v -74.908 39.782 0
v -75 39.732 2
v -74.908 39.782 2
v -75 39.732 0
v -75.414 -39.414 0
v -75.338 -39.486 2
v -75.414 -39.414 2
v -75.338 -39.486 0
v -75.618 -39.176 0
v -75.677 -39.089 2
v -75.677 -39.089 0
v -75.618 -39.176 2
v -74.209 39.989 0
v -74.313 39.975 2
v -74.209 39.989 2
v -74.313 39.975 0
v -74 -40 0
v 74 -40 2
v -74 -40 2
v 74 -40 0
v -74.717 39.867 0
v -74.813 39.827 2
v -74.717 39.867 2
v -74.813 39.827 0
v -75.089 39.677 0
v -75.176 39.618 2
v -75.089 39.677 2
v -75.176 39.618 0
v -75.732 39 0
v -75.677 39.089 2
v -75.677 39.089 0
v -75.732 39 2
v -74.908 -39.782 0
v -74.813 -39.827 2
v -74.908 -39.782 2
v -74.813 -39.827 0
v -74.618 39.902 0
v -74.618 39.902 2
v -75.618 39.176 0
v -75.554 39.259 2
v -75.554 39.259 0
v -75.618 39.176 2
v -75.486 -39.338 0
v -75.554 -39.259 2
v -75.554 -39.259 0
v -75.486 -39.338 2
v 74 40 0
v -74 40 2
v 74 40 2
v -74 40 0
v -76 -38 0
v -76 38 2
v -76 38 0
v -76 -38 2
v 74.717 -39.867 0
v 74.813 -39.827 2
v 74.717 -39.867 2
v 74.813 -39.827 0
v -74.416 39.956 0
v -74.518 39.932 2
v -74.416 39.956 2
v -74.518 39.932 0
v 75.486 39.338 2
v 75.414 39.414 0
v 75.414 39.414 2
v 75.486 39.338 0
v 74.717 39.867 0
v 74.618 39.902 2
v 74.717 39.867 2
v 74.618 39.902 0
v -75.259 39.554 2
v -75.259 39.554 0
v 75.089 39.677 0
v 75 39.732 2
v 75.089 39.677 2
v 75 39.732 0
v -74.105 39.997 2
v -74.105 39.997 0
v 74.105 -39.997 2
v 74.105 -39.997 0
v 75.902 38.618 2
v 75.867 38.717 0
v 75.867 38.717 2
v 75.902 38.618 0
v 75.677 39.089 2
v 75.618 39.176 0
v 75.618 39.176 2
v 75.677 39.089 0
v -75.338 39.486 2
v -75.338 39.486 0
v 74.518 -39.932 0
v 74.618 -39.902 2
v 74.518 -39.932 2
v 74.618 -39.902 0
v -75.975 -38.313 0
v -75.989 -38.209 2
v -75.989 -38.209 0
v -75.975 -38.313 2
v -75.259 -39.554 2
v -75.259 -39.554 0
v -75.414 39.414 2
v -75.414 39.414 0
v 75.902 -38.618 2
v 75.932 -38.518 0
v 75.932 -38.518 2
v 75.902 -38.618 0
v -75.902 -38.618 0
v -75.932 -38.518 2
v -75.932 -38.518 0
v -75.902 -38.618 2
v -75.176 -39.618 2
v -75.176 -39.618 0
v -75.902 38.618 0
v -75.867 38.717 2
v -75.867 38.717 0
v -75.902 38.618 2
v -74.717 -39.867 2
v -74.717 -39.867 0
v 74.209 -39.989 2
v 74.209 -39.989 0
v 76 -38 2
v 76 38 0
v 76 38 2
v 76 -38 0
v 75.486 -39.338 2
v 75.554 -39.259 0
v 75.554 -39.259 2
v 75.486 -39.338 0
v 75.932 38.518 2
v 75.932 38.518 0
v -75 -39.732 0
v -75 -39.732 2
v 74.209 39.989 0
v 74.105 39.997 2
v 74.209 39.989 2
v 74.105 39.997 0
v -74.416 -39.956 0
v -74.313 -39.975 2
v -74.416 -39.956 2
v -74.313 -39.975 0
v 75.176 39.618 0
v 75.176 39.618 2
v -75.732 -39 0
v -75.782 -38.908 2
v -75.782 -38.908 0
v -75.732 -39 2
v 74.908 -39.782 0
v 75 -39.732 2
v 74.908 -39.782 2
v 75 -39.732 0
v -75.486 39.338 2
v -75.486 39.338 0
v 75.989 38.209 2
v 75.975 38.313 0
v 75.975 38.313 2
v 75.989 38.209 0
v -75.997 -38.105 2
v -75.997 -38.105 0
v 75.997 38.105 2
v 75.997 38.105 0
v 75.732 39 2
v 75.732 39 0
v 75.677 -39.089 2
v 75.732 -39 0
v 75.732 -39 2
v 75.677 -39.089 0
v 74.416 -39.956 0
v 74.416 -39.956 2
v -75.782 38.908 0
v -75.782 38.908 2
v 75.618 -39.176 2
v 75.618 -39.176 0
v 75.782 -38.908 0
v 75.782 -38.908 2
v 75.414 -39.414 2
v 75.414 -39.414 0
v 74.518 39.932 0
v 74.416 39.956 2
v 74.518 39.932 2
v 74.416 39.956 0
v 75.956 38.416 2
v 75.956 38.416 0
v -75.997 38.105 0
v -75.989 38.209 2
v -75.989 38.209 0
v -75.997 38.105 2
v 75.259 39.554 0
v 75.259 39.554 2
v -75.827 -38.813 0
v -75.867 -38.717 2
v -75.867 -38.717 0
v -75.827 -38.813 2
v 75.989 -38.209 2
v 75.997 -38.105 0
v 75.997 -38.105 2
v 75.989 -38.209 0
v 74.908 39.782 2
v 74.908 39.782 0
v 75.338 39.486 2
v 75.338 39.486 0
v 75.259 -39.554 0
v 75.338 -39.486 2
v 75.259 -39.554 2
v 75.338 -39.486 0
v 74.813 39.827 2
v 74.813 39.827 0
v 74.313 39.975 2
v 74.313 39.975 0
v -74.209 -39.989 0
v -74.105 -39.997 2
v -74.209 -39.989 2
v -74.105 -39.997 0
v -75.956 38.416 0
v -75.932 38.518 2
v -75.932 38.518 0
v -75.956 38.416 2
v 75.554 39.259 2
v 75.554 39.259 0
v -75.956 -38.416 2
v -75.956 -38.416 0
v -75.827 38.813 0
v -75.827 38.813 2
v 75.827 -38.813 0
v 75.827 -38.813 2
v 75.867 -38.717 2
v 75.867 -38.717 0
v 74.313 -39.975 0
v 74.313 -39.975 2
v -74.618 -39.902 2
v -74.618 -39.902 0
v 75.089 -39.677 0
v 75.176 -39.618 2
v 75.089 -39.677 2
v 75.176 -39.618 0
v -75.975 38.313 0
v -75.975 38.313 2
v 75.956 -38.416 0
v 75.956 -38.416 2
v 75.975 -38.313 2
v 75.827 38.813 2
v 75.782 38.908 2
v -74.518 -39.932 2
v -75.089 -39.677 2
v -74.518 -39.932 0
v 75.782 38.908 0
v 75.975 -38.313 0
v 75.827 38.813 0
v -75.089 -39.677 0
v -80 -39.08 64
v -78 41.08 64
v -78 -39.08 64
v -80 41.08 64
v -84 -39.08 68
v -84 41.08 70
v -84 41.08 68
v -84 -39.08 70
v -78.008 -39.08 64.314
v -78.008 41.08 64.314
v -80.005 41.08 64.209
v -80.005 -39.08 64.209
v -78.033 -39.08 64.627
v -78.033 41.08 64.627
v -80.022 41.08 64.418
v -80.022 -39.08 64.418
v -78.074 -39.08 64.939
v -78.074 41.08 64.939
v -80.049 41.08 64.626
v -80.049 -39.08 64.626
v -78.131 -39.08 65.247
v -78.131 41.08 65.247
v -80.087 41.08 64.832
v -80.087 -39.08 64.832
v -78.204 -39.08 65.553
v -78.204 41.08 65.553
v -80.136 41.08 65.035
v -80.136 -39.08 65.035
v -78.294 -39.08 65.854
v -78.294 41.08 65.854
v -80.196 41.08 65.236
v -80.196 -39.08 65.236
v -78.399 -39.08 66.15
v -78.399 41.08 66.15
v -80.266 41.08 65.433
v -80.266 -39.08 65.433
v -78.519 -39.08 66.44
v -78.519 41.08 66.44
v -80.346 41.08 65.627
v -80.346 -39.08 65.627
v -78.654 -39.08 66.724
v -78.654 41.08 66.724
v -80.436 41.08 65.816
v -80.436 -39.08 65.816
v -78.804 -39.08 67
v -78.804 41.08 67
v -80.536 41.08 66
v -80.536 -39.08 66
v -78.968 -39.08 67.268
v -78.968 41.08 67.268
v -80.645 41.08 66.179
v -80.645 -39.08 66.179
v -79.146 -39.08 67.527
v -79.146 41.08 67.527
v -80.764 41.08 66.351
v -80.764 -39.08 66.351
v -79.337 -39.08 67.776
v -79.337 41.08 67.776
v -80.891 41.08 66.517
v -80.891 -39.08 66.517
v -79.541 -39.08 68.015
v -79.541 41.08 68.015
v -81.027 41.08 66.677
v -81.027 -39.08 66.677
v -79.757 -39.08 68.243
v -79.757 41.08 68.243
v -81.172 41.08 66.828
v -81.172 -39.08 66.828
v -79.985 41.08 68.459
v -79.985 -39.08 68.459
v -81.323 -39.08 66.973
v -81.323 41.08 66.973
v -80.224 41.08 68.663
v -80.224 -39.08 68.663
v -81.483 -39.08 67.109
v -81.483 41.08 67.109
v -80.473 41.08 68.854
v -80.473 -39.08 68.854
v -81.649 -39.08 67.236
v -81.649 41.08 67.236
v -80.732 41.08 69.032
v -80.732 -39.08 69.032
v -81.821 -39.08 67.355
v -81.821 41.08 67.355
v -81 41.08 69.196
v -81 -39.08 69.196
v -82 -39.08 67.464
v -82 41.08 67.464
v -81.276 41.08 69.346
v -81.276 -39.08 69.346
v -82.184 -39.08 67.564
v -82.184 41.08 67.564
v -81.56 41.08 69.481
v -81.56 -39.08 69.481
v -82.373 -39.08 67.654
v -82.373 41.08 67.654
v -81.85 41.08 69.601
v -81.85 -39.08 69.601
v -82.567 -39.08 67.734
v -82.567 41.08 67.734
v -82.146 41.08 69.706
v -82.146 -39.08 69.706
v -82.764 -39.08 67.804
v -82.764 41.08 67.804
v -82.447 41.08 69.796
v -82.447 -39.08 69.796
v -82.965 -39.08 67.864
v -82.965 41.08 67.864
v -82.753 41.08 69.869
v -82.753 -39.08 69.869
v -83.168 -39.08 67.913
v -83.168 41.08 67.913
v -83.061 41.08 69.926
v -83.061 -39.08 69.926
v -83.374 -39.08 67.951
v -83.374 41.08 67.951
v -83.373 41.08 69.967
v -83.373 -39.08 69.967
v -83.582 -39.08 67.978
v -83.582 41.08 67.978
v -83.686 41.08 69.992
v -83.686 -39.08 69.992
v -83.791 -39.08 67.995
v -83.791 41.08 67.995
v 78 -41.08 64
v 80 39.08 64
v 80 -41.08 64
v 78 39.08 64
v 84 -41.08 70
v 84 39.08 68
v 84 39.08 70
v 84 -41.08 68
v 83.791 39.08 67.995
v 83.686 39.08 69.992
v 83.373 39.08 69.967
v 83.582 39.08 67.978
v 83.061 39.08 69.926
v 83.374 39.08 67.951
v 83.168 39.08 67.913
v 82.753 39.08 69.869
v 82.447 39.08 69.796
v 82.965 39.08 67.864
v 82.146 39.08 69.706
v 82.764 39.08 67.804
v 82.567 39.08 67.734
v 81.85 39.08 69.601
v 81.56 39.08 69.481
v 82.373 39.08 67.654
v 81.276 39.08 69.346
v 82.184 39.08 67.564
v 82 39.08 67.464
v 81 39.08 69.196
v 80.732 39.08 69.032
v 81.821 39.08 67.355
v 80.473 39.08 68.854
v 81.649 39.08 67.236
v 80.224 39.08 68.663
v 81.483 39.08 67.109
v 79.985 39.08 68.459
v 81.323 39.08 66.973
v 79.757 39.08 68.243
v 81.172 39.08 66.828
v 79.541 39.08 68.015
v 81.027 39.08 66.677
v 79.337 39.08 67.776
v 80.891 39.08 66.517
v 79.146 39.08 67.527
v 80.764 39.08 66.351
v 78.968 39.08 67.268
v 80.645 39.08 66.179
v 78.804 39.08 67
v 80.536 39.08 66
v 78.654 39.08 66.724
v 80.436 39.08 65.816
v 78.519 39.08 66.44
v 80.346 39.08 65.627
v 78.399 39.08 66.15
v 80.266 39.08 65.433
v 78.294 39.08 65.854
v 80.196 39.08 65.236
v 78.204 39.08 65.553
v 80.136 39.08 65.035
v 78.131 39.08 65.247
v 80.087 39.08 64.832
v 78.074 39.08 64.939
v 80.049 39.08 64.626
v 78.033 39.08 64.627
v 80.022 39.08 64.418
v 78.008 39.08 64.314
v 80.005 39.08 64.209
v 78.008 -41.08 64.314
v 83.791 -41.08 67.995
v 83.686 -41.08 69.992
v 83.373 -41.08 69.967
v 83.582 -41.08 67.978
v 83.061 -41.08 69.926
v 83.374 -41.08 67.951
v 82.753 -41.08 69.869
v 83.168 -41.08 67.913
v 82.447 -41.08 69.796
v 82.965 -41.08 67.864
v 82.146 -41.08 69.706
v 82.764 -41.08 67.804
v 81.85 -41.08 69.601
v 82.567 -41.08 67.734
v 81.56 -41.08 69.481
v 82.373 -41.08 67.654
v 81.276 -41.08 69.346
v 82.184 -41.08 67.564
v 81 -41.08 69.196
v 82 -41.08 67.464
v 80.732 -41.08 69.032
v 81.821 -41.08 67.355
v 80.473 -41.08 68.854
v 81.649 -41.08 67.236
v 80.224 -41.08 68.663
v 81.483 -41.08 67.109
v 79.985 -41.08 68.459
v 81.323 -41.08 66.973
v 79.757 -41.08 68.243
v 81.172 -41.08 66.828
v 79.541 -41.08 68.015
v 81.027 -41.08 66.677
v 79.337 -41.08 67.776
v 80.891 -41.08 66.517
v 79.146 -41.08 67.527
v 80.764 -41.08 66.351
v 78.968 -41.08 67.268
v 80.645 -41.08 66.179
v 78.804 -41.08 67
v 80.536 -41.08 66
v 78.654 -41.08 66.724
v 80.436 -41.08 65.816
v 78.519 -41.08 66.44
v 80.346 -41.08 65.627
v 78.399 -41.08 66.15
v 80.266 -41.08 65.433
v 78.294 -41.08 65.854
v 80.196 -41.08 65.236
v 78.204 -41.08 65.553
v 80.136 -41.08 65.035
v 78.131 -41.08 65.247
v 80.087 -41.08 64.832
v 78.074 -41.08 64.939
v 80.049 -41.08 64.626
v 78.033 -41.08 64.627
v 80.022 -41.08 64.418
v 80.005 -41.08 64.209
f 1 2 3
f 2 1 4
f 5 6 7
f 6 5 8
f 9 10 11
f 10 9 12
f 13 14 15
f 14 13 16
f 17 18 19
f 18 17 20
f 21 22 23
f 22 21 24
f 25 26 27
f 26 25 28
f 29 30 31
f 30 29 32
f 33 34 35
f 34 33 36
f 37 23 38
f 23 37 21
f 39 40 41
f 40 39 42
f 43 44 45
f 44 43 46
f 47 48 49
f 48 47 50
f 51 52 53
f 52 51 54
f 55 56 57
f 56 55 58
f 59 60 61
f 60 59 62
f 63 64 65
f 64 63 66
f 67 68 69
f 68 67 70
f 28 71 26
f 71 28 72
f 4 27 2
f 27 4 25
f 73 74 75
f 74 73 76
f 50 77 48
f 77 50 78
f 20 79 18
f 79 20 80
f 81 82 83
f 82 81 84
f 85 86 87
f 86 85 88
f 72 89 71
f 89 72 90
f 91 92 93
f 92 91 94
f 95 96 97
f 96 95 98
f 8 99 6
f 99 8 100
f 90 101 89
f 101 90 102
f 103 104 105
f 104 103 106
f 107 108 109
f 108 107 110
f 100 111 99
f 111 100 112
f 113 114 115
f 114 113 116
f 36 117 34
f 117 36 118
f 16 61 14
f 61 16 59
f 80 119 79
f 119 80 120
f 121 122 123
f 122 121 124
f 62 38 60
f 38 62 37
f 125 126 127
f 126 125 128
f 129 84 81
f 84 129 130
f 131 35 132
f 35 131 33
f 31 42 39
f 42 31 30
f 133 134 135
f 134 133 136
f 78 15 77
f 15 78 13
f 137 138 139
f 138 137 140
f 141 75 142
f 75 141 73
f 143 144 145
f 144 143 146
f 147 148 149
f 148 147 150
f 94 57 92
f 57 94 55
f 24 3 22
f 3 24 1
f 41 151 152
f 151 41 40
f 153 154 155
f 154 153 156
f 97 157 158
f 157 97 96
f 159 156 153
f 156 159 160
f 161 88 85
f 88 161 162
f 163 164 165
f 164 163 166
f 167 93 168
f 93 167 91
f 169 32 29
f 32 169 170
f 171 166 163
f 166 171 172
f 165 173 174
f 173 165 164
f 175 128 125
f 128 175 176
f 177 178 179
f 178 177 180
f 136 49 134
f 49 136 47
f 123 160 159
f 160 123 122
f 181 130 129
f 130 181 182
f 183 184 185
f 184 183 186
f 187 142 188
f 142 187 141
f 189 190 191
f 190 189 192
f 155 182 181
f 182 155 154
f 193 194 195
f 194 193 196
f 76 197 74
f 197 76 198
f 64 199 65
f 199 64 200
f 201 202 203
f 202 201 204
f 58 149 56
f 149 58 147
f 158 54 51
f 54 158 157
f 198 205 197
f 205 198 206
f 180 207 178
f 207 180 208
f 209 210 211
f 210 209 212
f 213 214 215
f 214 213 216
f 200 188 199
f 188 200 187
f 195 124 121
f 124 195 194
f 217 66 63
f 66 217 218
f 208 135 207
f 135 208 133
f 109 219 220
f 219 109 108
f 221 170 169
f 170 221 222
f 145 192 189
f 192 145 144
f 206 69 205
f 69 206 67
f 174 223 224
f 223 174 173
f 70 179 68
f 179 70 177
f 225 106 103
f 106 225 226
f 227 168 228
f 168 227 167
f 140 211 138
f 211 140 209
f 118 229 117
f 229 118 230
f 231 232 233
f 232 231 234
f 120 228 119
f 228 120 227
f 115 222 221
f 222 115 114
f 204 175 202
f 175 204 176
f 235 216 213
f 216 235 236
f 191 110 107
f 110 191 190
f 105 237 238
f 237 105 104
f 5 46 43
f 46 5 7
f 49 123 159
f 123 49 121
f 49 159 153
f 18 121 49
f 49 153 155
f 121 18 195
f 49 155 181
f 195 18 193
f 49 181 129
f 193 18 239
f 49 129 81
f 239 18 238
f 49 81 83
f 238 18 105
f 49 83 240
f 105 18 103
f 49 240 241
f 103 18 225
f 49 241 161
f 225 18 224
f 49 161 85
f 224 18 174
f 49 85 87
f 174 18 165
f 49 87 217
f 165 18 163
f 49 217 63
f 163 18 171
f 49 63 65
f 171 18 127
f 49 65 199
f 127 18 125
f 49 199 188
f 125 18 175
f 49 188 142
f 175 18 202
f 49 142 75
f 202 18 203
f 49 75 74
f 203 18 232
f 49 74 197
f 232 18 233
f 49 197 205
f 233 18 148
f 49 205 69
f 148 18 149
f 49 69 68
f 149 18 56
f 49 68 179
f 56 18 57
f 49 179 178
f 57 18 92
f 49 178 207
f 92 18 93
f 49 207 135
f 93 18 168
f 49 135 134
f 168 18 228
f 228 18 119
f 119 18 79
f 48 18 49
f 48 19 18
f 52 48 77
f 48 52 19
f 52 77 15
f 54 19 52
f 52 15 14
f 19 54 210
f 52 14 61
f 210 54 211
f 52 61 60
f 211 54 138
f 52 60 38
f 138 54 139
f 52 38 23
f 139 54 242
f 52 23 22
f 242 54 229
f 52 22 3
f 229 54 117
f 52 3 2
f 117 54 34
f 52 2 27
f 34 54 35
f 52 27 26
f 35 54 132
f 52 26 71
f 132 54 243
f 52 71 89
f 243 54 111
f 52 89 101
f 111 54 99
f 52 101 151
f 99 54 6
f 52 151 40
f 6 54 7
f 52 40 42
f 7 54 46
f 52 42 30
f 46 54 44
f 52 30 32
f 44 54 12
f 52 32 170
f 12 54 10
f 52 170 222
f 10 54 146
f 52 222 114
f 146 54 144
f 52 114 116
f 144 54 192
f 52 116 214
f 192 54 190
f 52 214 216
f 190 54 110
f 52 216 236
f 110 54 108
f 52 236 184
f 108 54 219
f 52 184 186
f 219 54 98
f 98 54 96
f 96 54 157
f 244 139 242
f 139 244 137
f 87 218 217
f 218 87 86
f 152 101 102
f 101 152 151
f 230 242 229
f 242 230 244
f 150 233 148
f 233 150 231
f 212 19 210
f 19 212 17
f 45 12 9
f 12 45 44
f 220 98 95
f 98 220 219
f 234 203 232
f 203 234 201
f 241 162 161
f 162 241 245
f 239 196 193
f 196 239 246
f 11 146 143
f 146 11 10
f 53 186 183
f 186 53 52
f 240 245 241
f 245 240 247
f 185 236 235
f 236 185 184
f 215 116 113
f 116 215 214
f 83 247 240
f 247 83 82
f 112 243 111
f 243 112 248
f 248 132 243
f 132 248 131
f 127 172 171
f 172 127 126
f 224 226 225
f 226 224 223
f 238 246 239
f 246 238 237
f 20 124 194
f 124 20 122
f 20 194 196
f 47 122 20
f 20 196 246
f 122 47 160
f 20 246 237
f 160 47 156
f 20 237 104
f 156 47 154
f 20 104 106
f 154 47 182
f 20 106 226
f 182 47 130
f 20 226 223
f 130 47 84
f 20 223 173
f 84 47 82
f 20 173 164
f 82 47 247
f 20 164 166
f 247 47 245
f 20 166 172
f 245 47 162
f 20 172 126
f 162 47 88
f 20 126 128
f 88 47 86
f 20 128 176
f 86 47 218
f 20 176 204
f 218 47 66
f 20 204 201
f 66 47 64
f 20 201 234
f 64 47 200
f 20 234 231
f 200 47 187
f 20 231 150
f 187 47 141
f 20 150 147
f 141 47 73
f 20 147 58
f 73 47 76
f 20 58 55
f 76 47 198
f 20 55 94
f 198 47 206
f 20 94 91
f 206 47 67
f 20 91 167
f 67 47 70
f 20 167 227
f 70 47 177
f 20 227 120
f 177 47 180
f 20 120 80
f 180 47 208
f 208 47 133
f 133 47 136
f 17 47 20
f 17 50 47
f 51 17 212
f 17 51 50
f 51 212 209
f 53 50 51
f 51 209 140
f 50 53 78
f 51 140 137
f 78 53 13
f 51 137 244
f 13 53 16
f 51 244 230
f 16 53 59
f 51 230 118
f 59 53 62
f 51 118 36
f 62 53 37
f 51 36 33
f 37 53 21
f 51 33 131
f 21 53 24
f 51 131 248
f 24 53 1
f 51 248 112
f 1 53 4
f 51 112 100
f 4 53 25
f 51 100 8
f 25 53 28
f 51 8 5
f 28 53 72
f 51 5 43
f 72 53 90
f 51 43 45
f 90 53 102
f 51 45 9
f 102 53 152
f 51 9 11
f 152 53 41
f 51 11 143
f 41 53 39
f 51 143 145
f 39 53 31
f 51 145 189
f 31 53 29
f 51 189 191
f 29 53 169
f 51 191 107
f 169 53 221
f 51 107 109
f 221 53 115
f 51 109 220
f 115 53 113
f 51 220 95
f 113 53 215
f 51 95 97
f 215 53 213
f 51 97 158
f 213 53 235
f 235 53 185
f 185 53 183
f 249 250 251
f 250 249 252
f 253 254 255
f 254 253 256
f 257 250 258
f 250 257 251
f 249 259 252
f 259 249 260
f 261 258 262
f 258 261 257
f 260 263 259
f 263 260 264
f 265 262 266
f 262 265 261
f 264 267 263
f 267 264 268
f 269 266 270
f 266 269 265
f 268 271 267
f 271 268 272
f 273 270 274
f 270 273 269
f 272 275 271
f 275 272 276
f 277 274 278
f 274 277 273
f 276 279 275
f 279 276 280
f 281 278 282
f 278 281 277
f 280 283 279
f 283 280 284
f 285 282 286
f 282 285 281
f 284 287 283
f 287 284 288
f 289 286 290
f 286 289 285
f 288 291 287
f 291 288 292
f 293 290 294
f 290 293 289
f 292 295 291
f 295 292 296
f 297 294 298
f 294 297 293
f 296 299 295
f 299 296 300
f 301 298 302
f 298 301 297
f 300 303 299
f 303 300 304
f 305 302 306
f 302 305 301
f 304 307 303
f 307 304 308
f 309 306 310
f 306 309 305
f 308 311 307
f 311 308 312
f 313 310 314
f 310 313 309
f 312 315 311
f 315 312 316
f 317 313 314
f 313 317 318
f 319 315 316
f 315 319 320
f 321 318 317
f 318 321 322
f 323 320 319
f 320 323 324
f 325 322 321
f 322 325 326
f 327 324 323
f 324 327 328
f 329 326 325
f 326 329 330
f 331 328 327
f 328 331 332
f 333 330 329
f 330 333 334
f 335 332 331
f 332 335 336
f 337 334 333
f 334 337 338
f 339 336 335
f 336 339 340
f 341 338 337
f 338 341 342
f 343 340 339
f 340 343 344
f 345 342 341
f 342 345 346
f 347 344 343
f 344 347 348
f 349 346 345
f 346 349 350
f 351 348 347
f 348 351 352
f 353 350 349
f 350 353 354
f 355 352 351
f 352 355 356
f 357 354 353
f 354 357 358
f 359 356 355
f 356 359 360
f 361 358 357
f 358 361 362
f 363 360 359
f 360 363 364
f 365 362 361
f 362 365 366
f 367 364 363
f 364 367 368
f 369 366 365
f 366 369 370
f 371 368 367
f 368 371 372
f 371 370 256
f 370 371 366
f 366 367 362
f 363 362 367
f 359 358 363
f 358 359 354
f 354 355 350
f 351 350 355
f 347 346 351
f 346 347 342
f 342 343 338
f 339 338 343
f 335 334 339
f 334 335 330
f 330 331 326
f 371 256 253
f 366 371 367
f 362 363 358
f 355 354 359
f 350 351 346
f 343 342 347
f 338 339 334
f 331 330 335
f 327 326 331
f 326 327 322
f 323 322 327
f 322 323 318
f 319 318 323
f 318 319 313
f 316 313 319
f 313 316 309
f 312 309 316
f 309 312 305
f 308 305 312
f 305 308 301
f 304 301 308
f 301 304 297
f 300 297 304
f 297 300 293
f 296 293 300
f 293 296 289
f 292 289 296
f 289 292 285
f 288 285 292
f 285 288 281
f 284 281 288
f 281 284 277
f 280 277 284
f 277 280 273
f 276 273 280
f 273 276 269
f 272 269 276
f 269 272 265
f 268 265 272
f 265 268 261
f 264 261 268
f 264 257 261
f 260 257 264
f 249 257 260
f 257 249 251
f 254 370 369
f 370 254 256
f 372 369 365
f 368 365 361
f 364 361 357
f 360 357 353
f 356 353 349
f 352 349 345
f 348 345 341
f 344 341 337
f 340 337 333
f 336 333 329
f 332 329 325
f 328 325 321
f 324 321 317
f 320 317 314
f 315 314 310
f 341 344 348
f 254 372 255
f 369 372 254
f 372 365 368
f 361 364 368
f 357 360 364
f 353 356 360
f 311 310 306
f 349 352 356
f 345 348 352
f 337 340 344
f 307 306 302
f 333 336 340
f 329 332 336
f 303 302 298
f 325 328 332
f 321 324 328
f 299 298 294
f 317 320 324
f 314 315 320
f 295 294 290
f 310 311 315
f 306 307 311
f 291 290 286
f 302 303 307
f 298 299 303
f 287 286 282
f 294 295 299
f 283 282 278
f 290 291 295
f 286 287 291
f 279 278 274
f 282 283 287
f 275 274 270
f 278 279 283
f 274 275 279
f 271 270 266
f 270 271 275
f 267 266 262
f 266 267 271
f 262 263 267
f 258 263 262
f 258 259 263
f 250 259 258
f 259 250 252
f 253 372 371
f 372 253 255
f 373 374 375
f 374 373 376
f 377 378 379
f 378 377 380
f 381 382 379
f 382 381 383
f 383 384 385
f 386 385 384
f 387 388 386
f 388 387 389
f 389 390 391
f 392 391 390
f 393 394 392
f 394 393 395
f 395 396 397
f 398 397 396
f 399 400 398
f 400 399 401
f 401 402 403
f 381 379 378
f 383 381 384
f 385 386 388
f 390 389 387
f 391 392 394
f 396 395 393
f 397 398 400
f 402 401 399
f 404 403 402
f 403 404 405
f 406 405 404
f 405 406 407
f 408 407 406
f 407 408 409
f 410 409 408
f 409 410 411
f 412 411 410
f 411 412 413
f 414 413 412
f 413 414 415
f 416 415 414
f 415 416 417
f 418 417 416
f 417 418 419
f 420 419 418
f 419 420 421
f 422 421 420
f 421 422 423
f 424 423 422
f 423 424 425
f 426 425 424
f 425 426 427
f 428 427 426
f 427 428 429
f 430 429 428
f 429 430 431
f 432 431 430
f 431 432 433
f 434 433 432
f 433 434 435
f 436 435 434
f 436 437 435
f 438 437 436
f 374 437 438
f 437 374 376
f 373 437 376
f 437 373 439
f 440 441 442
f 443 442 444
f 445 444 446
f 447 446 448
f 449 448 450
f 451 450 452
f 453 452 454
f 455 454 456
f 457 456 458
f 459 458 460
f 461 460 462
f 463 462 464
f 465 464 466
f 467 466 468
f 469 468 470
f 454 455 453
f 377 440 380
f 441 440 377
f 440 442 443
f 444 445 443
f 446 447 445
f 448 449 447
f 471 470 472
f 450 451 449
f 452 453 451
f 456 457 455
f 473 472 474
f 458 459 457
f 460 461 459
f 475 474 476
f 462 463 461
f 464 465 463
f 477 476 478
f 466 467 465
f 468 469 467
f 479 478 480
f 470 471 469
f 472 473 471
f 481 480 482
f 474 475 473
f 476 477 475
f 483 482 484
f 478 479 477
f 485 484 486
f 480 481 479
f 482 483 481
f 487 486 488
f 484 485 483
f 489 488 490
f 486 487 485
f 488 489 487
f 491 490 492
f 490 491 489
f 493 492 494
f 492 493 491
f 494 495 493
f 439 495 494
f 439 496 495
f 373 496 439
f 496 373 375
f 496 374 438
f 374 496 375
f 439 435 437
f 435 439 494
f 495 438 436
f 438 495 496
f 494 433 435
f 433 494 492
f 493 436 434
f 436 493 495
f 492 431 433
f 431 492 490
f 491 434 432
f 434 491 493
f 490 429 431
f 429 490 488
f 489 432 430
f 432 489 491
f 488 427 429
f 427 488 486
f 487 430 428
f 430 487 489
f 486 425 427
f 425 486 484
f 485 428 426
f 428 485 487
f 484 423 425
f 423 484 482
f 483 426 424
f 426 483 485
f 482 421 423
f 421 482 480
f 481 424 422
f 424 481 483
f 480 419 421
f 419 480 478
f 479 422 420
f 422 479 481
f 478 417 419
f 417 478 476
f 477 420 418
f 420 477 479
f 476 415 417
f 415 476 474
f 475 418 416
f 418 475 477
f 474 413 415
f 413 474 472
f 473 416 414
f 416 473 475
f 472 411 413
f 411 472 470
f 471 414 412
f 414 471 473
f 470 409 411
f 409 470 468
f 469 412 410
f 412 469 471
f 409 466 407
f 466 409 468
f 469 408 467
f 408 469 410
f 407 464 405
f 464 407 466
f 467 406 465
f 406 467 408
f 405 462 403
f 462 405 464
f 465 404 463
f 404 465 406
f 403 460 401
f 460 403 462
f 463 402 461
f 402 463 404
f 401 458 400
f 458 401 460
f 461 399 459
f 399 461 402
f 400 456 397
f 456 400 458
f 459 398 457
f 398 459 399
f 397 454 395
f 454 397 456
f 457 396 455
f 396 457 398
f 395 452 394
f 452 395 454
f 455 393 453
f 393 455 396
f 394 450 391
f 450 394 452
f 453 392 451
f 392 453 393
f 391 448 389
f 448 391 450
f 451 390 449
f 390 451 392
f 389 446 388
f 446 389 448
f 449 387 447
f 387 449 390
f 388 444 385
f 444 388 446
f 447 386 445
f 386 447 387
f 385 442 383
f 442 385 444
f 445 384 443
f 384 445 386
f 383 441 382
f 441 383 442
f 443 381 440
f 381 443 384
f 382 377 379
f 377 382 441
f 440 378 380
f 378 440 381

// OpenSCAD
baseLength = 150;
baseWidth = 78;
height = 62;
topLength = 158;
thickness = 2;
radius = 2;
$fn = 120;
keysWidth = 60;
keysDepth = 22;
brimRadius = 4;
trifle = 0.000000000000001;

union() { 
	translate([-baseLength/2+thickness/2, -baseWidth/2+thickness/2, -trifle]) minkowski() {
		cube([baseLength-radius, baseWidth-radius, thickness/2]);
		cylinder(r = radius, h = thickness/2);
	}

	translate([0, 0, thickness]) linear_extrude(height = height, scale = topLength/baseLength) union() {
			difference() {
				roundedRect([baseLength, baseWidth], radius);
				roundedRect([baseLength-2*thickness, baseWidth-2*thickness], radius);
			}
			translate([-baseLength/2, -baseWidth/2+keysDepth, 0]) square([baseLength, thickness]);
			translate([-baseLength/2+keysWidth, -baseWidth/2, 0]) square([thickness, keysDepth]);
	}

	translate([-topLength/2-thickness*2.5, (baseWidth*topLength/baseLength)/2, height+thickness+trifle]) rotate([90, 0, 0]) rotate_extrude(angle = 90) translate([brimRadius, 0, 0]) square([thickness, baseWidth*topLength/baseLength-thickness]);

	translate([topLength/2+thickness*2.5, -(baseWidth*topLength/baseLength)/2, height+thickness+trifle]) rotate([90, 0, 180]) rotate_extrude(angle = 90) translate([brimRadius, 0, 0]) square([thickness, baseWidth*topLength/baseLength-thickness]);
}

// size - [x,y]
// radius - radius of corners
module roundedRect(size, radius)
{
	x = size[0];
	y = size[1];

	hull()
	{
		// place 4 circles in the corners, with the given radius
		translate([(-x/2)+(radius/2), (-y/2)+(radius/2), 0])
		circle(r = radius);
	
		translate([(x/2)-(radius/2), (-y/2)+(radius/2), 0])
		circle(r = radius);
	
		translate([(-x/2)+(radius/2), (y/2)-(radius/2), 0])
		circle(r = radius);
	
		translate([(x/2)-(radius/2), (y/2)-(radius/2), 0])
		circle(r = radius);
	}
}
